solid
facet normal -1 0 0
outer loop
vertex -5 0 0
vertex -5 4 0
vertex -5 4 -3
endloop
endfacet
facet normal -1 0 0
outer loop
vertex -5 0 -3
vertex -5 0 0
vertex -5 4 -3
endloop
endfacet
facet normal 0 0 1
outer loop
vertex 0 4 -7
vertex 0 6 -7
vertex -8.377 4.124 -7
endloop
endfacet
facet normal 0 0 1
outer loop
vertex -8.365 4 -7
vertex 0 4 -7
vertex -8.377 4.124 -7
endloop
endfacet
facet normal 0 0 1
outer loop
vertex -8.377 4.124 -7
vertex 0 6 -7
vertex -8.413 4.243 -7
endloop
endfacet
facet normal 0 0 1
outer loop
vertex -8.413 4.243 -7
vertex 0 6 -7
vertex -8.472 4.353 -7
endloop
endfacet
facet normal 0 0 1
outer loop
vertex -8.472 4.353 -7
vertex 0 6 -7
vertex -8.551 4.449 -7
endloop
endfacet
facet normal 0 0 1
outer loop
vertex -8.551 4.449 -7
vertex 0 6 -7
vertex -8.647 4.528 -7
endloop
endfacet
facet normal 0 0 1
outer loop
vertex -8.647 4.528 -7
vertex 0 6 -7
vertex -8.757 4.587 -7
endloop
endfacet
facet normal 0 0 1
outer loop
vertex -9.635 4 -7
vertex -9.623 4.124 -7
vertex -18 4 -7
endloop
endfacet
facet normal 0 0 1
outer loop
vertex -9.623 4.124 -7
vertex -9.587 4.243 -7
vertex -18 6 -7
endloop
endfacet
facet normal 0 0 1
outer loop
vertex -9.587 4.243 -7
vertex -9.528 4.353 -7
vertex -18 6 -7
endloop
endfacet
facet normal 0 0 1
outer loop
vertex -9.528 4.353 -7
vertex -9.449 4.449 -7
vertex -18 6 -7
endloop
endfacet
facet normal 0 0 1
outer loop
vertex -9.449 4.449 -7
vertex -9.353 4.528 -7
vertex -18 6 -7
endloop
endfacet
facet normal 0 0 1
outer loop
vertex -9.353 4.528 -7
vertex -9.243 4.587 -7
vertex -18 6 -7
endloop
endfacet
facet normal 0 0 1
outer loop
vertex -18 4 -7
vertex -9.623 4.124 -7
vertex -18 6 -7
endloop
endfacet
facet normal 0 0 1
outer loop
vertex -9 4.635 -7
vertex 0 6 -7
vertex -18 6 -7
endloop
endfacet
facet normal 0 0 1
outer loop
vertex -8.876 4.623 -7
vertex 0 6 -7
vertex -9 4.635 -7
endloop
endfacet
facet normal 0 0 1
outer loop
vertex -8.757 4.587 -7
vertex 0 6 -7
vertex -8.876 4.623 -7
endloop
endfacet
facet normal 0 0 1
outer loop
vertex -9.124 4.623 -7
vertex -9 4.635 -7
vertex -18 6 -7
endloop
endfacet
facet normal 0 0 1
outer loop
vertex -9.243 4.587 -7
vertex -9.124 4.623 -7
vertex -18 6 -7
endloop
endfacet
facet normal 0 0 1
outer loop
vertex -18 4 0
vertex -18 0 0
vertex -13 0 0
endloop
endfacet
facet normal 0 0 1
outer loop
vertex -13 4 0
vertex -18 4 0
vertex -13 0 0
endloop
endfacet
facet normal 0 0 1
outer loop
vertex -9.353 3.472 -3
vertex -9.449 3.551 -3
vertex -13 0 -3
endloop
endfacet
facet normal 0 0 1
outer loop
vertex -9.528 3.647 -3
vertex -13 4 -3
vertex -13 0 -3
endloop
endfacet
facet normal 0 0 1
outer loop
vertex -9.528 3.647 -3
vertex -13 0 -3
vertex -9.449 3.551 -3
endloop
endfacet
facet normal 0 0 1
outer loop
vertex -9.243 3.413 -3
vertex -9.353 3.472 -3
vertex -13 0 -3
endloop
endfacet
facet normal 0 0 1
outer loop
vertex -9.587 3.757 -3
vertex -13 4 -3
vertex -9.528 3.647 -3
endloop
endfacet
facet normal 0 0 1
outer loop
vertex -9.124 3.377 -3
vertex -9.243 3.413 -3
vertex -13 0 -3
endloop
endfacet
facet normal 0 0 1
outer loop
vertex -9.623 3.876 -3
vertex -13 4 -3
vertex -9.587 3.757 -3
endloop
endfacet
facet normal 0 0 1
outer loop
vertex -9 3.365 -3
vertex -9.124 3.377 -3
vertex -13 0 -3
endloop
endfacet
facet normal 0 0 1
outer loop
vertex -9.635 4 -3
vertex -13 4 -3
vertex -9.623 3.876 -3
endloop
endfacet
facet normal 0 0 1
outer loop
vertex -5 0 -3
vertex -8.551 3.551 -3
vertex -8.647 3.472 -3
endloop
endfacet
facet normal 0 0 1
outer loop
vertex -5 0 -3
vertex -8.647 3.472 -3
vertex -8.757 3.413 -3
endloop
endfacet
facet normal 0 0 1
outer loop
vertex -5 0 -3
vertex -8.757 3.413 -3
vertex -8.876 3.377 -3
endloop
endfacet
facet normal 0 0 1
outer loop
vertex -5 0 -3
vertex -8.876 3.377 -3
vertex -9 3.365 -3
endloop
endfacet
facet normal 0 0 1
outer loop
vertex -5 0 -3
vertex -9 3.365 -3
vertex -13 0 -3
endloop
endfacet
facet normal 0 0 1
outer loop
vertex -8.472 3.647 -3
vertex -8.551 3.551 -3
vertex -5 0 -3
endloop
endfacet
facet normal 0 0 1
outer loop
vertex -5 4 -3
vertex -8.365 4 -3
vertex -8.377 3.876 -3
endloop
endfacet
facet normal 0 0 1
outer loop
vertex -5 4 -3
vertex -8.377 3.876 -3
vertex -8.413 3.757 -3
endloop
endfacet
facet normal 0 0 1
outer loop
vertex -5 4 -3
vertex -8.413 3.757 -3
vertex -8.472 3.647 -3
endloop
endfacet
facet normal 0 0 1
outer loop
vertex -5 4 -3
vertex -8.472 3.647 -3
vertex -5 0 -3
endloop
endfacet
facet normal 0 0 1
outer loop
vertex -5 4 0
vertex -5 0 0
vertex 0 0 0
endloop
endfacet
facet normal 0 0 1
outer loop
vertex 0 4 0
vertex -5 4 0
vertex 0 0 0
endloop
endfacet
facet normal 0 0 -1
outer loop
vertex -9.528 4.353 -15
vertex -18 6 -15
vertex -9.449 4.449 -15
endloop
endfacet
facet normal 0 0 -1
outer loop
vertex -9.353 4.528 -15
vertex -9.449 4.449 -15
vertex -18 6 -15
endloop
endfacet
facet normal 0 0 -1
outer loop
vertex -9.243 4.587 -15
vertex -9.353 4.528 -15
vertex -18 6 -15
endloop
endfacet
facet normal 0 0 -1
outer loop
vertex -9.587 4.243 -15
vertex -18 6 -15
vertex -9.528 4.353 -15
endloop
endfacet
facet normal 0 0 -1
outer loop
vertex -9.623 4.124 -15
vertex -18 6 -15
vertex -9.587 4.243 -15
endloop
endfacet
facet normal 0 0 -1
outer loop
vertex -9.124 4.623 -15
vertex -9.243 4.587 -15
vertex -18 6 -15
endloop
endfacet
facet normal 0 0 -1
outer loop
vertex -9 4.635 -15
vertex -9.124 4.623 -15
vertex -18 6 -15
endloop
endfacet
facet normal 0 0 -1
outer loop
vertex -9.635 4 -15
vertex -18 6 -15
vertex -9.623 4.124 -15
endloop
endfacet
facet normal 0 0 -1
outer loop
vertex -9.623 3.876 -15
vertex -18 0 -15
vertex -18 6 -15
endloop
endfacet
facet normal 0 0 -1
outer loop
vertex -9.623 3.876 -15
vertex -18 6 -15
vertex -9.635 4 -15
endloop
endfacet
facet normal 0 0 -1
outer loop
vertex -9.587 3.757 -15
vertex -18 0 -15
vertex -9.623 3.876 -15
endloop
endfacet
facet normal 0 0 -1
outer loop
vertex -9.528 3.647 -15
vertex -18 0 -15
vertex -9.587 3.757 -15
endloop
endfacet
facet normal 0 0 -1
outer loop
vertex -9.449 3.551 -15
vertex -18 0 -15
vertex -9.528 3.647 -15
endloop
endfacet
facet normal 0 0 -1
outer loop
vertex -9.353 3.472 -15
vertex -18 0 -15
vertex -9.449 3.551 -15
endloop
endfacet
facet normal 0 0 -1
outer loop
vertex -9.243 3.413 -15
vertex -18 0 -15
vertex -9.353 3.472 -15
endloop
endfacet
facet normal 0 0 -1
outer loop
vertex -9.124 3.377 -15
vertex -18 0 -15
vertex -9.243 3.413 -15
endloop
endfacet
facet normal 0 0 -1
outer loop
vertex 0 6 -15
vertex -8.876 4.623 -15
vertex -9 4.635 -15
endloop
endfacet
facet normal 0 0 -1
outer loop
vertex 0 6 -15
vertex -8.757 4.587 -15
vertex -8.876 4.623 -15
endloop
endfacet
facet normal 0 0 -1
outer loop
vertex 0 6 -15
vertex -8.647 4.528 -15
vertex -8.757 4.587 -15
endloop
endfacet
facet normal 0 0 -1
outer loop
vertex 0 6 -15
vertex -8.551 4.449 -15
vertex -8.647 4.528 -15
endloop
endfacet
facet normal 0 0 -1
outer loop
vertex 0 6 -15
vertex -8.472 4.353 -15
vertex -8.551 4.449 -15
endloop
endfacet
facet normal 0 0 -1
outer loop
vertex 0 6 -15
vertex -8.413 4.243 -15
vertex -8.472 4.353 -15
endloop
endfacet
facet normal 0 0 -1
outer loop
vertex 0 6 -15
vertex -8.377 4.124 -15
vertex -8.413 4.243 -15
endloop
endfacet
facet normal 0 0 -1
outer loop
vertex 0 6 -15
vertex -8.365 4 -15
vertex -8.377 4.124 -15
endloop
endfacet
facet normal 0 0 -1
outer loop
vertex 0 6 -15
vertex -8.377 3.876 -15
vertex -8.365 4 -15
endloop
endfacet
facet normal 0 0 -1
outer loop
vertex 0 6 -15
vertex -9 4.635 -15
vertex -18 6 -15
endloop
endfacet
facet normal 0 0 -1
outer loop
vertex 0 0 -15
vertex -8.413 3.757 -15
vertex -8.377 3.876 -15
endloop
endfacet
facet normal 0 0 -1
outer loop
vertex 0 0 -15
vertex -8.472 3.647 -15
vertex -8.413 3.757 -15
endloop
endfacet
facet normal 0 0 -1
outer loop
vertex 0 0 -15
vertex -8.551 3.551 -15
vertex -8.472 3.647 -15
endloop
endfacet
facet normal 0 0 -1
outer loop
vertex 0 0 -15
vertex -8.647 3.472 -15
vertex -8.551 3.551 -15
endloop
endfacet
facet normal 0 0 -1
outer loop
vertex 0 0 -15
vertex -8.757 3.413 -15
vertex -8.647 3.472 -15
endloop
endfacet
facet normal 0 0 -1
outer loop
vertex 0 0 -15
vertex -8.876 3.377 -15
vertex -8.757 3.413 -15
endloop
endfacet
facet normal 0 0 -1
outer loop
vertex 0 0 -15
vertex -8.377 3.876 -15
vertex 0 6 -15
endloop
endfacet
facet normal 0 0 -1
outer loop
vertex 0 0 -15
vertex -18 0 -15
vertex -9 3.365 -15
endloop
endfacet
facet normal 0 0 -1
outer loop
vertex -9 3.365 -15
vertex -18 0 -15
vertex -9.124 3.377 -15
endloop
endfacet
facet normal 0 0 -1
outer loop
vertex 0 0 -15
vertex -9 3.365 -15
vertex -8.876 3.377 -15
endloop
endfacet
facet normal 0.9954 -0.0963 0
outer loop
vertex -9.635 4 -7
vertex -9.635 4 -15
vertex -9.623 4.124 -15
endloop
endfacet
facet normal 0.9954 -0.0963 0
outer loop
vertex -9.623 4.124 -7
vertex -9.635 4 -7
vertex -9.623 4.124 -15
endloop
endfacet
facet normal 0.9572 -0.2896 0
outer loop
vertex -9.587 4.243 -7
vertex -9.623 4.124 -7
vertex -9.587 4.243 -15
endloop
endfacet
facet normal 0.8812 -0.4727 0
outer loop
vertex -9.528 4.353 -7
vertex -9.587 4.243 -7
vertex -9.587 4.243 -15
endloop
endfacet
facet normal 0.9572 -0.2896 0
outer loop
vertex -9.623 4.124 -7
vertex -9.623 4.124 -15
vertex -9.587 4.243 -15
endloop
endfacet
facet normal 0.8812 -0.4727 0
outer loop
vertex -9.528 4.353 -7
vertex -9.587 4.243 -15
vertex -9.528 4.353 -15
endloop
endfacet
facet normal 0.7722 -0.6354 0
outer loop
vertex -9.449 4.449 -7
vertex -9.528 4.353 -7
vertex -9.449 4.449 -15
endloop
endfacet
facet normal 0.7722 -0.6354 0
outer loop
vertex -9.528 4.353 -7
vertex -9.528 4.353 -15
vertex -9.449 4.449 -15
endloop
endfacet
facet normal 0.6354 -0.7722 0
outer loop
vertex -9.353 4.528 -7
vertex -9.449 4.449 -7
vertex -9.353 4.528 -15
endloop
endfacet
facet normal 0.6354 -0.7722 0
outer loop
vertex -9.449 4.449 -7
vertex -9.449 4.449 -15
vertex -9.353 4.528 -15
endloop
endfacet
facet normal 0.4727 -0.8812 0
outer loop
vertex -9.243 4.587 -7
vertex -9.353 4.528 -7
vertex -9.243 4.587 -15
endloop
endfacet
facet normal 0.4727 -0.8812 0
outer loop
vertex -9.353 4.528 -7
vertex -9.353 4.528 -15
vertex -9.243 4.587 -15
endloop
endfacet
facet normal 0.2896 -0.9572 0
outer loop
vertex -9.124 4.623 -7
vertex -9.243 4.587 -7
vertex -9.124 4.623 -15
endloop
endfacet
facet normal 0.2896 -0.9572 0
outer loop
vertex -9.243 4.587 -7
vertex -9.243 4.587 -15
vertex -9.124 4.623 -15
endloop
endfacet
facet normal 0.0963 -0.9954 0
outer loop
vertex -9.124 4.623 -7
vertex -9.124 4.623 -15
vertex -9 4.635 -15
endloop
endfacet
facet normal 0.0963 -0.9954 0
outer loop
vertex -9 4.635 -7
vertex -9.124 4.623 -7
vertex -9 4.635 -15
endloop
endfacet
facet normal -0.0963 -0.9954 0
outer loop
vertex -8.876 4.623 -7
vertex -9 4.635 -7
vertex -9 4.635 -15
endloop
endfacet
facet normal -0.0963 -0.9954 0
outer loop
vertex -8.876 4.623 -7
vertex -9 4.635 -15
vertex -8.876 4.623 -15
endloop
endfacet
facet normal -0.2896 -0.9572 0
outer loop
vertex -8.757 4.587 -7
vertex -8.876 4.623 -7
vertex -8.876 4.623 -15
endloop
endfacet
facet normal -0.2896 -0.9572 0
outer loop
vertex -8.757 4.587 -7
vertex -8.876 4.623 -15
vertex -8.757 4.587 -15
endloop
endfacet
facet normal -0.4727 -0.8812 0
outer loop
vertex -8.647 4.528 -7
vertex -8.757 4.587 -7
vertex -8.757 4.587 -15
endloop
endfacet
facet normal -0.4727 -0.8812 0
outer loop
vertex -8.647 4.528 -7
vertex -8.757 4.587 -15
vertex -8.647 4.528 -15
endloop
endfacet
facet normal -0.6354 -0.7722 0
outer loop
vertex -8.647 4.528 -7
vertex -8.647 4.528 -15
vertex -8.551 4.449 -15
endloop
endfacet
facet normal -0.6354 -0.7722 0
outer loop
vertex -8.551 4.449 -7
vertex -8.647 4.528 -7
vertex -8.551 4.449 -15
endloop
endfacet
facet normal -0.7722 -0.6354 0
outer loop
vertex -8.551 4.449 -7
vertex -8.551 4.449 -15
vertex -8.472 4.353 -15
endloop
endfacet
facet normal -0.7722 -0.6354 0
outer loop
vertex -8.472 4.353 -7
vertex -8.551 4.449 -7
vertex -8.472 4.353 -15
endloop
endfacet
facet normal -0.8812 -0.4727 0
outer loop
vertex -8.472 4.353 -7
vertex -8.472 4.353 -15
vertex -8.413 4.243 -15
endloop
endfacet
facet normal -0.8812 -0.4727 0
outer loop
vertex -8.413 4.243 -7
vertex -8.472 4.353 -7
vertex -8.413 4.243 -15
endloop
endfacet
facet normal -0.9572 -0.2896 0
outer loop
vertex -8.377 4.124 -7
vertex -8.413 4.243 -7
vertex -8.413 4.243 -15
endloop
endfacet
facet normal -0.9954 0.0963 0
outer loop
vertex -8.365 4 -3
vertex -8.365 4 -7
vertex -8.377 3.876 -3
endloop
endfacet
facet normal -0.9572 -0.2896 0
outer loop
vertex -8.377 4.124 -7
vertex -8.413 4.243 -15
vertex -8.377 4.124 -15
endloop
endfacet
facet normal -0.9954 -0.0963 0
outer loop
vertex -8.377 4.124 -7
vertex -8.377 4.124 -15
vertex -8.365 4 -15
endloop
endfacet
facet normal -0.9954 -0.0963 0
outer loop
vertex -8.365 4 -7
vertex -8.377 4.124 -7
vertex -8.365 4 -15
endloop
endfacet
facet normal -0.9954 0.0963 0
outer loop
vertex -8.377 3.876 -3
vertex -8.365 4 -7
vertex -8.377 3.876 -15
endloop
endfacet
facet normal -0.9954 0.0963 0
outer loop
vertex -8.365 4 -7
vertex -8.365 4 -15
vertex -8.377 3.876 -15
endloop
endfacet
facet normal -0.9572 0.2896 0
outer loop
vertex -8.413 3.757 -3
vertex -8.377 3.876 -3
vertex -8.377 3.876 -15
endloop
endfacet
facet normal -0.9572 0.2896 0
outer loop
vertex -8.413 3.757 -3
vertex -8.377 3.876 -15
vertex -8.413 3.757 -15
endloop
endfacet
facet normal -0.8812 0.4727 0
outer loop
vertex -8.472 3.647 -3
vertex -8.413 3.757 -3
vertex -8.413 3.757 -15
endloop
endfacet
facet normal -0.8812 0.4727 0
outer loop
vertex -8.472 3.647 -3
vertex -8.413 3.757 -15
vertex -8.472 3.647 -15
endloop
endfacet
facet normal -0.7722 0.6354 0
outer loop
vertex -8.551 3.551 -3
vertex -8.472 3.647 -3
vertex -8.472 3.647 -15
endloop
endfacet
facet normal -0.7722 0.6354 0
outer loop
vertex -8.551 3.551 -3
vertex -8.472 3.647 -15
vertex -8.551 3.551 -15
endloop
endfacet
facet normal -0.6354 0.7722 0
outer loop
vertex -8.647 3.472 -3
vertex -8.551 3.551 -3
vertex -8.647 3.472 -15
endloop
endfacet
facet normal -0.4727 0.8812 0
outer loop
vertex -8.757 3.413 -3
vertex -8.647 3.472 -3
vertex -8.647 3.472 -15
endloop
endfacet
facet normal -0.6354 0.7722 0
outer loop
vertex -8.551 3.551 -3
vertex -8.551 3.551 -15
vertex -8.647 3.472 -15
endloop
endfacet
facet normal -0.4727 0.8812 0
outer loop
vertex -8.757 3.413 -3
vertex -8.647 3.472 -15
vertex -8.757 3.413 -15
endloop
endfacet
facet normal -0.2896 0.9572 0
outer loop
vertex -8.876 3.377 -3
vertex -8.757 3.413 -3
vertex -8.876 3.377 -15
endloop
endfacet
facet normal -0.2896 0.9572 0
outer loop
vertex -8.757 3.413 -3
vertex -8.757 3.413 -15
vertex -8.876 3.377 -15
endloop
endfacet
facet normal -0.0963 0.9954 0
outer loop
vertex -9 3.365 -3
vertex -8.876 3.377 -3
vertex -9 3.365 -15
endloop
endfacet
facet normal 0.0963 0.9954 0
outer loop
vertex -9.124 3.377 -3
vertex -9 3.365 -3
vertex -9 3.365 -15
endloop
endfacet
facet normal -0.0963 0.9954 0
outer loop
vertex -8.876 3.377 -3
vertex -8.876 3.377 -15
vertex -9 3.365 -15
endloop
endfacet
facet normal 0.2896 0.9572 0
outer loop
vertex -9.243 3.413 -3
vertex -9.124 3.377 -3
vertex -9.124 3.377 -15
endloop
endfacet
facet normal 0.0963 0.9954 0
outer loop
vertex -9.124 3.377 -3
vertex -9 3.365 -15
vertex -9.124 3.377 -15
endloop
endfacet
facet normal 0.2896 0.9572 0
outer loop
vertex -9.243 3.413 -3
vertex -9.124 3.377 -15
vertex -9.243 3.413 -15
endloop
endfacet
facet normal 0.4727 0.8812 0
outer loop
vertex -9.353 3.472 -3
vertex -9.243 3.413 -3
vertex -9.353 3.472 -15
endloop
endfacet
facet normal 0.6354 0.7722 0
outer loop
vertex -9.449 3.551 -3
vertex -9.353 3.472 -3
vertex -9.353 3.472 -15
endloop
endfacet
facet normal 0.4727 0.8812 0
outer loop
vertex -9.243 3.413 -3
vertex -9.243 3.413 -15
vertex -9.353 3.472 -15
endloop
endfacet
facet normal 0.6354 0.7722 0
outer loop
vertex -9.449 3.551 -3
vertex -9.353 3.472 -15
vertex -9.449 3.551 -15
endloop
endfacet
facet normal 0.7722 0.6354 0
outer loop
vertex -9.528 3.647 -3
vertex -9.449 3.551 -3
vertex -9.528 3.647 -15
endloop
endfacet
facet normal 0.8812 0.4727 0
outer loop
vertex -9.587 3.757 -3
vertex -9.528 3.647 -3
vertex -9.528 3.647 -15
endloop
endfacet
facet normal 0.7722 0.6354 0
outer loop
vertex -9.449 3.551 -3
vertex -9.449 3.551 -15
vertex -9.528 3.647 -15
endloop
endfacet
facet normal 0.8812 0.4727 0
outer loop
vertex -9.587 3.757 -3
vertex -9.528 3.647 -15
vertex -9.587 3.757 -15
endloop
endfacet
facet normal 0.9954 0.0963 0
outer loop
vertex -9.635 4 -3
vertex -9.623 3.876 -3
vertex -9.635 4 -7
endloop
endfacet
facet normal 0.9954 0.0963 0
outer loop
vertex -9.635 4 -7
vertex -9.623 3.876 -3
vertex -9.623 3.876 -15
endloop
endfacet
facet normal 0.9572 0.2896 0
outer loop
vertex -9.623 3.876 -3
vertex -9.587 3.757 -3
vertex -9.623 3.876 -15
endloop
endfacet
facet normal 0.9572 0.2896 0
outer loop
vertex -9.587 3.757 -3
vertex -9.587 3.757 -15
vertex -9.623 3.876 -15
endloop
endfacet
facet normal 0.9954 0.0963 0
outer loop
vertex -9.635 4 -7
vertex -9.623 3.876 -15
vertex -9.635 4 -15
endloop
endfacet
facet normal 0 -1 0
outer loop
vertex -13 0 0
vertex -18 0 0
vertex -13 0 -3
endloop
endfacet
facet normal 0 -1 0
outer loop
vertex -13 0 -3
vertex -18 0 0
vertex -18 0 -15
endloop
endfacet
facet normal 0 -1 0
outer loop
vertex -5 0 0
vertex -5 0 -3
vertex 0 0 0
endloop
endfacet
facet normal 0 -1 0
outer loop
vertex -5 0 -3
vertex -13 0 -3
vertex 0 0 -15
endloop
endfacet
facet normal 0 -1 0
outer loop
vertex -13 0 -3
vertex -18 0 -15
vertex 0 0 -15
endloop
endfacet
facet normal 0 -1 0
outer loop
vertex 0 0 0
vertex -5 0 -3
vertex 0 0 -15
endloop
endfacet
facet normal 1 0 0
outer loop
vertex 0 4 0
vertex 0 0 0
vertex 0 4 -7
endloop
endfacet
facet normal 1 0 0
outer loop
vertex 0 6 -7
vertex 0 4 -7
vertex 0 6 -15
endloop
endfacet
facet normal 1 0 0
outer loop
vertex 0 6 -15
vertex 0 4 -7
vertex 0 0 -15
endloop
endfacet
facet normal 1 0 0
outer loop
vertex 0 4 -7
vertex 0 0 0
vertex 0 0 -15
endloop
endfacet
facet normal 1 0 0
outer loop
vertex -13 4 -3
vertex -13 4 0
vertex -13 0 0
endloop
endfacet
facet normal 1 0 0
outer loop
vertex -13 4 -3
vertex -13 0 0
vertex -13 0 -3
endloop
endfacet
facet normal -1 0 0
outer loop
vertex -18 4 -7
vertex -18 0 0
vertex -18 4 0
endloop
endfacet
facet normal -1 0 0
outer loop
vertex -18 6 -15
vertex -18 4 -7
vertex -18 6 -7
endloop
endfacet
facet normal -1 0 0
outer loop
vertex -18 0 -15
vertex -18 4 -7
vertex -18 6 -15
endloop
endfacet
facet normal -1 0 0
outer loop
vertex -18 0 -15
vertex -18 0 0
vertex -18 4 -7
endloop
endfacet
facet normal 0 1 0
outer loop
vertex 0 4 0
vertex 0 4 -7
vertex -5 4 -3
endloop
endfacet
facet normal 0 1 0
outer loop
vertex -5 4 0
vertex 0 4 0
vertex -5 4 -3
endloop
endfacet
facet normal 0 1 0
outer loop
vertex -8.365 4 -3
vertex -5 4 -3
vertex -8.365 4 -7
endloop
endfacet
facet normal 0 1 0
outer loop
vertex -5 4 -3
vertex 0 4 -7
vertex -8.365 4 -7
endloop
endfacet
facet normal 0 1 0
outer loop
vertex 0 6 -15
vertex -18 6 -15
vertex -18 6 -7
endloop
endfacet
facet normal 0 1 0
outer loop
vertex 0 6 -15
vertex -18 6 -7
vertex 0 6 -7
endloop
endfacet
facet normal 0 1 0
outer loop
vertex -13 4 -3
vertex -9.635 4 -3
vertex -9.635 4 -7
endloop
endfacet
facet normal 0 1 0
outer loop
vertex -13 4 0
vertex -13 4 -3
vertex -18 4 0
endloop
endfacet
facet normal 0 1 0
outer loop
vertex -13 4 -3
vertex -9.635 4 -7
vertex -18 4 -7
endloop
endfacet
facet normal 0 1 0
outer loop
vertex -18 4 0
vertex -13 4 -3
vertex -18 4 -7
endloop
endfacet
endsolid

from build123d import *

# Parameters (mm, degrees)
SKETCH2_W           = 18
SKETCH2_H           = 15
BOSS_EXTRUDE2_DEPTH = 6
CUT_EXTRUDE3_DEPTH  = 2
SKETCH7_W           = 8
SKETCH7_H           = 3
CUT_EXTRUDE4_DEPTH  = 24.769728648
SKETCH12_R          = 0.635
CUT_EXTRUDE5_DEPTH  = 25.186773245


with BuildPart() as part:
    # Sketch2 → Boss-Extrude2 (new body)
    with BuildSketch(Plane(origin=(0, 0, 0), x_dir=(1, 0, 0), z_dir=(0, 1, 0))):
        with Locations((-9, 7.5)):
            Rectangle(SKETCH2_W, SKETCH2_H)
    extrude(amount=BOSS_EXTRUDE2_DEPTH)

    # Sketch6 → Cut-Extrude3 (cut)
    with BuildSketch(Plane(origin=(0, 6, 0), x_dir=(1, 0, 0), z_dir=(0, 1, 0))):
        Polygon((0, 7), (0, 0), (-2, 0), (-18, 0), (-18, 7), (-2, 7), align=None)
    extrude(amount=-CUT_EXTRUDE3_DEPTH, mode=Mode.SUBTRACT)

    # Sketch7 → Cut-Extrude4 (cut, through all)
    with BuildSketch(Plane(origin=(0, 4, 0), x_dir=(1, 0, 0), z_dir=(0, 1, 0))):
        with Locations((-9, 1.5)):
            Rectangle(SKETCH7_W, SKETCH7_H)
    extrude(amount=-CUT_EXTRUDE4_DEPTH, mode=Mode.SUBTRACT)

    # Sketch12 → Cut-Extrude5 (cut, through all)
    with BuildSketch(Plane(origin=(0, 0, -15), x_dir=(-1, 0, 0), z_dir=(0, 0, -1))):
        with Locations((9, 4)):
            Circle(SKETCH12_R)
    extrude(amount=-CUT_EXTRUDE5_DEPTH, mode=Mode.SUBTRACT)


solid = part.part
